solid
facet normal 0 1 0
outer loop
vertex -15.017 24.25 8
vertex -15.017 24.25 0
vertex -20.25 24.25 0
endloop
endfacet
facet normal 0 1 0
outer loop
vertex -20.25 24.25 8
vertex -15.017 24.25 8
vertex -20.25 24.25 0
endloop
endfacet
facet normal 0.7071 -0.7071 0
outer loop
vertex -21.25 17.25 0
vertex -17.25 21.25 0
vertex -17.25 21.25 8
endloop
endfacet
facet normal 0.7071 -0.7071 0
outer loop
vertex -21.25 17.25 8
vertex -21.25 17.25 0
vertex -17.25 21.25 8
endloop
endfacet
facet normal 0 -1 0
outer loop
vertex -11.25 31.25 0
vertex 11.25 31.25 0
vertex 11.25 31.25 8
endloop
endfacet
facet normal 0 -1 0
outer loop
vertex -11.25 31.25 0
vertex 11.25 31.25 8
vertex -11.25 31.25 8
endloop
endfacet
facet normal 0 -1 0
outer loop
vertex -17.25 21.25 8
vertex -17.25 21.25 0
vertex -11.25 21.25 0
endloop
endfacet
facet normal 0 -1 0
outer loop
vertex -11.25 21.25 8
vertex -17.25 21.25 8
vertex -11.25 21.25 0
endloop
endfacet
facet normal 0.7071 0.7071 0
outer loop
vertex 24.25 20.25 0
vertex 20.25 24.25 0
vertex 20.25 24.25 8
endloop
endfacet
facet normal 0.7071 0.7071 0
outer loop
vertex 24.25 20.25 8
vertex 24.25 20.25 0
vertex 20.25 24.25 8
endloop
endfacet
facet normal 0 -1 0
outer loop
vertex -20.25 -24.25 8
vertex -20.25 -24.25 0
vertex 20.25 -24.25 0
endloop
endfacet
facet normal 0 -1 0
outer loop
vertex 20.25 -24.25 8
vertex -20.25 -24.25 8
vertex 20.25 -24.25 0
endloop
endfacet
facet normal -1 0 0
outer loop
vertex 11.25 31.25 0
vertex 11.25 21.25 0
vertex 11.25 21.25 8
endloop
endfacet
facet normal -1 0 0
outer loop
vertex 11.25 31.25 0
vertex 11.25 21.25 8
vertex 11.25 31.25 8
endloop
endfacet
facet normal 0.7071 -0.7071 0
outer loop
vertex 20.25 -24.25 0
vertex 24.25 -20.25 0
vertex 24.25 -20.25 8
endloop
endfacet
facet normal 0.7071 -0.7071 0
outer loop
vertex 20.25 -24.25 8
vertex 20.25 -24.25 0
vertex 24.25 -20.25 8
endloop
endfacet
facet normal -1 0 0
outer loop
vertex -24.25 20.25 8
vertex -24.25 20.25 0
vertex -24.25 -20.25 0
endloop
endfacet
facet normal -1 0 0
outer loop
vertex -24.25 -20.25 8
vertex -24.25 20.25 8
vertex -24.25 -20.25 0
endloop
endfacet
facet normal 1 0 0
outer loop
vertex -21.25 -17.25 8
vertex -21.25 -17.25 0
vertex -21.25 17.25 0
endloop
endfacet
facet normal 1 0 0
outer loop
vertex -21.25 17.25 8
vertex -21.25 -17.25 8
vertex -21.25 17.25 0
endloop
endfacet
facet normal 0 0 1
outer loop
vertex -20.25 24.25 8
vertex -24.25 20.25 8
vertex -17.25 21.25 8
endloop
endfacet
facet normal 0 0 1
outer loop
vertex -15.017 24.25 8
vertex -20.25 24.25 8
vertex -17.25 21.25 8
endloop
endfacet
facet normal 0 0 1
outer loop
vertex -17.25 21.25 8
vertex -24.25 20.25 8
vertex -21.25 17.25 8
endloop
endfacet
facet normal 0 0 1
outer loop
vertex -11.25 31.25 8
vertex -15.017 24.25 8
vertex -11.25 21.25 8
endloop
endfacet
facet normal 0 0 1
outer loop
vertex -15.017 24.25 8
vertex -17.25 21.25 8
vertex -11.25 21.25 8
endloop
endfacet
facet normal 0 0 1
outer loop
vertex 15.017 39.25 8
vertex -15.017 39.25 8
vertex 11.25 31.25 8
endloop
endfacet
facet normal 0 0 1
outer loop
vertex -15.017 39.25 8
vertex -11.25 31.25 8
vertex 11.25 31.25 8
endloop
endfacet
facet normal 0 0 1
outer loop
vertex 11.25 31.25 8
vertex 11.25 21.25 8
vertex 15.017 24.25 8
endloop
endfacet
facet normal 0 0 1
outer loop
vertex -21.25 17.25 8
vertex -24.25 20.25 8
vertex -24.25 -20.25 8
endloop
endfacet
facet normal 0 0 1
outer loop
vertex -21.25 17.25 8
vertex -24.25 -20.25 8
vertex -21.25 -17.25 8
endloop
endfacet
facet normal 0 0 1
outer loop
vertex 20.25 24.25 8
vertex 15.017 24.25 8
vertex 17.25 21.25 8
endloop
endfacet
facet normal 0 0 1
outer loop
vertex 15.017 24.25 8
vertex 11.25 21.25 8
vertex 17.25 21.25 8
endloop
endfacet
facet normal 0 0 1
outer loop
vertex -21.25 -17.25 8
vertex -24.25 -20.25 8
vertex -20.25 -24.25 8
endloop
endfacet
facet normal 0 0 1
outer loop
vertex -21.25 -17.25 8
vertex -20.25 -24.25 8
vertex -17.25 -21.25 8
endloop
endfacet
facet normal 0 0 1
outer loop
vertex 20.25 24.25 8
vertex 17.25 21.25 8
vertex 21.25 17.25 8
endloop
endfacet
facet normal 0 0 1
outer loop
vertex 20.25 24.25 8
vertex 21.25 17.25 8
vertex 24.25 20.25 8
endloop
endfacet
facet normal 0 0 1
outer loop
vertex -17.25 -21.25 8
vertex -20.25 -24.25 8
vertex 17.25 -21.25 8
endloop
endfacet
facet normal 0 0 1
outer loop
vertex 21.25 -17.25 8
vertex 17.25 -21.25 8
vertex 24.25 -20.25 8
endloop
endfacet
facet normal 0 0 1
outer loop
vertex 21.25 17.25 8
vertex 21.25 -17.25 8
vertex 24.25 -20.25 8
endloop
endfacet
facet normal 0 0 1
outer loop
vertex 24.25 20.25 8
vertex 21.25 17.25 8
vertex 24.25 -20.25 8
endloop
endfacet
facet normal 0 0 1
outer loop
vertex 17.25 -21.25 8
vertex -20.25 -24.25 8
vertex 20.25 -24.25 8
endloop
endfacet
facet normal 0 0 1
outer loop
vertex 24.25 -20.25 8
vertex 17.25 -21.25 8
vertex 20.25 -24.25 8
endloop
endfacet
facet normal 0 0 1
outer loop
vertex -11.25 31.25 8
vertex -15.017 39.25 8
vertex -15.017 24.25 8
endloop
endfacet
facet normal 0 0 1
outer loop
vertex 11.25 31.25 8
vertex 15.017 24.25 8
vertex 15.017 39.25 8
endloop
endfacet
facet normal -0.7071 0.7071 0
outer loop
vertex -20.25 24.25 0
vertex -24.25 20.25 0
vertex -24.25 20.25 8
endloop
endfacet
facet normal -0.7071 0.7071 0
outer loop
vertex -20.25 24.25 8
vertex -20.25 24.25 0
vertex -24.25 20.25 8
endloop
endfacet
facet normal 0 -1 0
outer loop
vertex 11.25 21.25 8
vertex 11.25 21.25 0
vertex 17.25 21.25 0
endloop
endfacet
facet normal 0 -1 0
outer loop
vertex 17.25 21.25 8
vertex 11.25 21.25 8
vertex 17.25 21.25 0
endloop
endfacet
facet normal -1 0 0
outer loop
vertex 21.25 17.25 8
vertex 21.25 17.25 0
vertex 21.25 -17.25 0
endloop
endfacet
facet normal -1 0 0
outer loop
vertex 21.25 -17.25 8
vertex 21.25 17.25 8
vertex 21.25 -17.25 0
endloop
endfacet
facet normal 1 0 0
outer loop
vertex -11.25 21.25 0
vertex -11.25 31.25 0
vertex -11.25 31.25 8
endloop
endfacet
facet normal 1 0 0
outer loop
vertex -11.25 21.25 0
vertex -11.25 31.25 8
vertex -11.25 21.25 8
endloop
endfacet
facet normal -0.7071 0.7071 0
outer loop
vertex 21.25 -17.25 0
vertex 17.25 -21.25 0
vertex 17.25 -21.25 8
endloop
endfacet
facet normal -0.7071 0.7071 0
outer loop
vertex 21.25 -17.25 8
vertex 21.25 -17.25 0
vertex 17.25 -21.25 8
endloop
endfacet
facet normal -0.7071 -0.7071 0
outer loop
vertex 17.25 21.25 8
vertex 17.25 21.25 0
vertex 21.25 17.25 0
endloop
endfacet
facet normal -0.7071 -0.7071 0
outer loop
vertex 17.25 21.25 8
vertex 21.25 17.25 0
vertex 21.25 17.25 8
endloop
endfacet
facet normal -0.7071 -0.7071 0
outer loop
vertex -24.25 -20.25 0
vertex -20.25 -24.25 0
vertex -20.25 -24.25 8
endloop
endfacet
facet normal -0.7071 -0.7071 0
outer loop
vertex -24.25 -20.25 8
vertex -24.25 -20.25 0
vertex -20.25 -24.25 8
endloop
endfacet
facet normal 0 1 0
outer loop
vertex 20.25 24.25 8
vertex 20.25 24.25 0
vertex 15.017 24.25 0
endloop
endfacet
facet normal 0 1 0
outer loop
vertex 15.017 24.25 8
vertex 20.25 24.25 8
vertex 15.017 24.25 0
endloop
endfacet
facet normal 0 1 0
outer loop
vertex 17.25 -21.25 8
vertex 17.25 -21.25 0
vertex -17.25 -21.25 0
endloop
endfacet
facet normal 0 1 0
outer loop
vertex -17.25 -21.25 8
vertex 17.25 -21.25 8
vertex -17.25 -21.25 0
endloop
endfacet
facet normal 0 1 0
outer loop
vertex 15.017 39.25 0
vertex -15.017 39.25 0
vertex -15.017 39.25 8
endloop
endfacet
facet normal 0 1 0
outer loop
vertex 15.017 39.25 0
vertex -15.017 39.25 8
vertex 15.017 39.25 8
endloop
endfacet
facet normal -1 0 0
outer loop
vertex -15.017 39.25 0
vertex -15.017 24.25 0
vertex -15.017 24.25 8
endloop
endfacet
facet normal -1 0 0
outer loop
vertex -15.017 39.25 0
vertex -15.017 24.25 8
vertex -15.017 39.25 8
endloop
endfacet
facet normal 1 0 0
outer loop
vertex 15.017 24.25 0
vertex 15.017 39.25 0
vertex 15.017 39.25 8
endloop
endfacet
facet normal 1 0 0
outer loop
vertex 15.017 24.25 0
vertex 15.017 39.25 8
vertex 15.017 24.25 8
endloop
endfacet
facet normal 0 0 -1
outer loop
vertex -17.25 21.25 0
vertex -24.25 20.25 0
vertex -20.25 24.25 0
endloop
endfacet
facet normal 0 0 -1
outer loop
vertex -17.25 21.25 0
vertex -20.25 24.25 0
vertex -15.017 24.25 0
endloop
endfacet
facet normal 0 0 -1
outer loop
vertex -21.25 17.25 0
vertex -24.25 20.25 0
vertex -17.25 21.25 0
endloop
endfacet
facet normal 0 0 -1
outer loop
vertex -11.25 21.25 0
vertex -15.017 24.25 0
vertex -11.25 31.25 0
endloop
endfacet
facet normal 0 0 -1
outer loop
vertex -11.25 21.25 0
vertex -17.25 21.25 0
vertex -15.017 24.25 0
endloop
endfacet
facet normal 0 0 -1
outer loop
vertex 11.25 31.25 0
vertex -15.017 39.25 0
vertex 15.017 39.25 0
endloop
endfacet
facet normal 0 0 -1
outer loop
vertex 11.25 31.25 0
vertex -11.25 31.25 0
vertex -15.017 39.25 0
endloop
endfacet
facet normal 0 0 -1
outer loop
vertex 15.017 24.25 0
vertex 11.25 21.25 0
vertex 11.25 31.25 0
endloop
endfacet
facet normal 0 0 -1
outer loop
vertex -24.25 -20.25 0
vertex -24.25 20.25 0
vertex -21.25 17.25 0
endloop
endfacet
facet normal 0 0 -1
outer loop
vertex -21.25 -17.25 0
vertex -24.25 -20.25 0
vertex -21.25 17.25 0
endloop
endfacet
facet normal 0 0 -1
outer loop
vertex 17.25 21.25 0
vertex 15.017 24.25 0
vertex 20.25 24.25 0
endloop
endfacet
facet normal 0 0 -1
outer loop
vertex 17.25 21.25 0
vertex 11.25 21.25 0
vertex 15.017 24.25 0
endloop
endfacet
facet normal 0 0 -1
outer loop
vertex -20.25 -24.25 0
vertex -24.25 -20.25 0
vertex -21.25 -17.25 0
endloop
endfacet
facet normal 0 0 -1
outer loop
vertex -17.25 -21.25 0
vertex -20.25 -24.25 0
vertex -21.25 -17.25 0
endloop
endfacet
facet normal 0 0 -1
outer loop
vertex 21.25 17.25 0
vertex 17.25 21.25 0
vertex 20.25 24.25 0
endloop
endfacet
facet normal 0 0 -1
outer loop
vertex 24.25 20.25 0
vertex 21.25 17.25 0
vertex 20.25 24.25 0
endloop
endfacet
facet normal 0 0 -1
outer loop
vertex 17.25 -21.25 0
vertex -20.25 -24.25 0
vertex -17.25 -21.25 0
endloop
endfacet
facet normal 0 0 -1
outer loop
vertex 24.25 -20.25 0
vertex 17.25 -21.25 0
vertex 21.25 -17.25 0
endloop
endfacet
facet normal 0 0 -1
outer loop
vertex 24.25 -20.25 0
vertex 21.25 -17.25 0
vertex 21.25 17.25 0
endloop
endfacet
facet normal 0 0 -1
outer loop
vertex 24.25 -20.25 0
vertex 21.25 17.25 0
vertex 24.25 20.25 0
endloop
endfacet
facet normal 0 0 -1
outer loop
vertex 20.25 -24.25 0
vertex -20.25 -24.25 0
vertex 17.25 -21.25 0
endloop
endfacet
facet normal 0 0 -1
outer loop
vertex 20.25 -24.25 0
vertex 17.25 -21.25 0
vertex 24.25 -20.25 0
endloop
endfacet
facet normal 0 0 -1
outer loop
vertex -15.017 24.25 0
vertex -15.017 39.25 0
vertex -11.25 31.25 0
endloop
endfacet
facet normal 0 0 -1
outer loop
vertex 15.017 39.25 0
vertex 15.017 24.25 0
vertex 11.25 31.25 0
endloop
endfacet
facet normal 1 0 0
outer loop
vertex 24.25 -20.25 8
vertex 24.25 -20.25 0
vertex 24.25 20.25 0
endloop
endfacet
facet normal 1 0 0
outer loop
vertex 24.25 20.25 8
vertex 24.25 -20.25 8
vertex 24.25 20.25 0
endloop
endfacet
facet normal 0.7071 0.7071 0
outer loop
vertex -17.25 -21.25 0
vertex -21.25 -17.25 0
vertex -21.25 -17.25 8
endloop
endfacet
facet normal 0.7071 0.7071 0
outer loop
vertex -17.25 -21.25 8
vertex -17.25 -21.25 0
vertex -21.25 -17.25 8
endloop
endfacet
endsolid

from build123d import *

# Parameters (mm, degrees)
F1_DEPTH = 8
F2_SIZE  = 4
F3_W     = 11.25
F3_H     = 8
F4_DEPTH = 8


with BuildPart() as f1:
    # F0 (on Top) → F1 (new body)
    with BuildSketch(Plane.XY):
        Polygon((21.25, 21.25), (21.25, -21.25), (-21.25, -21.25), (-21.25, 21.25), (-11.25, 21.25), (-11.25, 24.250001), (-24.250001, 24.250001), (-24.250001, -24.250001), (24.250001, -24.250001), (24.250001, 24.250001), (11.25, 24.250001), (11.25, 21.25), align=None)
    extrude(amount=F1_DEPTH)

    # F2
    f2_edges = [f1.edges().sort_by_distance(p)[0] for p in [
        (-21.25, 21.25, 4),
        (-21.25, -21.25, 4),
        (21.25, -21.25, 4),
        (-24.250001, -24.250001, 4),
        (-24.250001, 24.250001, 4),
        (24.250001, 24.250001, 4),
        (21.25, 21.25, 4),
        (24.250001, -24.250001, 4),
    ]]
    chamfer(f2_edges, length=F2_SIZE)

    # F3 (on face) → F4 (join)
    with BuildSketch(Plane(origin=(0, 0, 0), x_dir=(1, 0, 0), z_dir=(0, 0, -1))):
        Polygon((-11.25, -31.250001), (-11.25, -24.250001), (-15.016655, -24.250001), (-15.016655, -39.250001), (-11.25, -39.250001), align=None)
        with Locations((-5.625, -35.250001)):
            Rectangle(F3_W, F3_H)
        with Locations((5.625, -35.250001)):
            Rectangle(F3_W, F3_H)
        Polygon((11.25, -24.250001), (11.25, -31.250001), (11.25, -39.250001), (15.016655, -39.250001), (15.016655, -24.250001), align=None)
    extrude(amount=-F4_DEPTH)


solid = f1.part
